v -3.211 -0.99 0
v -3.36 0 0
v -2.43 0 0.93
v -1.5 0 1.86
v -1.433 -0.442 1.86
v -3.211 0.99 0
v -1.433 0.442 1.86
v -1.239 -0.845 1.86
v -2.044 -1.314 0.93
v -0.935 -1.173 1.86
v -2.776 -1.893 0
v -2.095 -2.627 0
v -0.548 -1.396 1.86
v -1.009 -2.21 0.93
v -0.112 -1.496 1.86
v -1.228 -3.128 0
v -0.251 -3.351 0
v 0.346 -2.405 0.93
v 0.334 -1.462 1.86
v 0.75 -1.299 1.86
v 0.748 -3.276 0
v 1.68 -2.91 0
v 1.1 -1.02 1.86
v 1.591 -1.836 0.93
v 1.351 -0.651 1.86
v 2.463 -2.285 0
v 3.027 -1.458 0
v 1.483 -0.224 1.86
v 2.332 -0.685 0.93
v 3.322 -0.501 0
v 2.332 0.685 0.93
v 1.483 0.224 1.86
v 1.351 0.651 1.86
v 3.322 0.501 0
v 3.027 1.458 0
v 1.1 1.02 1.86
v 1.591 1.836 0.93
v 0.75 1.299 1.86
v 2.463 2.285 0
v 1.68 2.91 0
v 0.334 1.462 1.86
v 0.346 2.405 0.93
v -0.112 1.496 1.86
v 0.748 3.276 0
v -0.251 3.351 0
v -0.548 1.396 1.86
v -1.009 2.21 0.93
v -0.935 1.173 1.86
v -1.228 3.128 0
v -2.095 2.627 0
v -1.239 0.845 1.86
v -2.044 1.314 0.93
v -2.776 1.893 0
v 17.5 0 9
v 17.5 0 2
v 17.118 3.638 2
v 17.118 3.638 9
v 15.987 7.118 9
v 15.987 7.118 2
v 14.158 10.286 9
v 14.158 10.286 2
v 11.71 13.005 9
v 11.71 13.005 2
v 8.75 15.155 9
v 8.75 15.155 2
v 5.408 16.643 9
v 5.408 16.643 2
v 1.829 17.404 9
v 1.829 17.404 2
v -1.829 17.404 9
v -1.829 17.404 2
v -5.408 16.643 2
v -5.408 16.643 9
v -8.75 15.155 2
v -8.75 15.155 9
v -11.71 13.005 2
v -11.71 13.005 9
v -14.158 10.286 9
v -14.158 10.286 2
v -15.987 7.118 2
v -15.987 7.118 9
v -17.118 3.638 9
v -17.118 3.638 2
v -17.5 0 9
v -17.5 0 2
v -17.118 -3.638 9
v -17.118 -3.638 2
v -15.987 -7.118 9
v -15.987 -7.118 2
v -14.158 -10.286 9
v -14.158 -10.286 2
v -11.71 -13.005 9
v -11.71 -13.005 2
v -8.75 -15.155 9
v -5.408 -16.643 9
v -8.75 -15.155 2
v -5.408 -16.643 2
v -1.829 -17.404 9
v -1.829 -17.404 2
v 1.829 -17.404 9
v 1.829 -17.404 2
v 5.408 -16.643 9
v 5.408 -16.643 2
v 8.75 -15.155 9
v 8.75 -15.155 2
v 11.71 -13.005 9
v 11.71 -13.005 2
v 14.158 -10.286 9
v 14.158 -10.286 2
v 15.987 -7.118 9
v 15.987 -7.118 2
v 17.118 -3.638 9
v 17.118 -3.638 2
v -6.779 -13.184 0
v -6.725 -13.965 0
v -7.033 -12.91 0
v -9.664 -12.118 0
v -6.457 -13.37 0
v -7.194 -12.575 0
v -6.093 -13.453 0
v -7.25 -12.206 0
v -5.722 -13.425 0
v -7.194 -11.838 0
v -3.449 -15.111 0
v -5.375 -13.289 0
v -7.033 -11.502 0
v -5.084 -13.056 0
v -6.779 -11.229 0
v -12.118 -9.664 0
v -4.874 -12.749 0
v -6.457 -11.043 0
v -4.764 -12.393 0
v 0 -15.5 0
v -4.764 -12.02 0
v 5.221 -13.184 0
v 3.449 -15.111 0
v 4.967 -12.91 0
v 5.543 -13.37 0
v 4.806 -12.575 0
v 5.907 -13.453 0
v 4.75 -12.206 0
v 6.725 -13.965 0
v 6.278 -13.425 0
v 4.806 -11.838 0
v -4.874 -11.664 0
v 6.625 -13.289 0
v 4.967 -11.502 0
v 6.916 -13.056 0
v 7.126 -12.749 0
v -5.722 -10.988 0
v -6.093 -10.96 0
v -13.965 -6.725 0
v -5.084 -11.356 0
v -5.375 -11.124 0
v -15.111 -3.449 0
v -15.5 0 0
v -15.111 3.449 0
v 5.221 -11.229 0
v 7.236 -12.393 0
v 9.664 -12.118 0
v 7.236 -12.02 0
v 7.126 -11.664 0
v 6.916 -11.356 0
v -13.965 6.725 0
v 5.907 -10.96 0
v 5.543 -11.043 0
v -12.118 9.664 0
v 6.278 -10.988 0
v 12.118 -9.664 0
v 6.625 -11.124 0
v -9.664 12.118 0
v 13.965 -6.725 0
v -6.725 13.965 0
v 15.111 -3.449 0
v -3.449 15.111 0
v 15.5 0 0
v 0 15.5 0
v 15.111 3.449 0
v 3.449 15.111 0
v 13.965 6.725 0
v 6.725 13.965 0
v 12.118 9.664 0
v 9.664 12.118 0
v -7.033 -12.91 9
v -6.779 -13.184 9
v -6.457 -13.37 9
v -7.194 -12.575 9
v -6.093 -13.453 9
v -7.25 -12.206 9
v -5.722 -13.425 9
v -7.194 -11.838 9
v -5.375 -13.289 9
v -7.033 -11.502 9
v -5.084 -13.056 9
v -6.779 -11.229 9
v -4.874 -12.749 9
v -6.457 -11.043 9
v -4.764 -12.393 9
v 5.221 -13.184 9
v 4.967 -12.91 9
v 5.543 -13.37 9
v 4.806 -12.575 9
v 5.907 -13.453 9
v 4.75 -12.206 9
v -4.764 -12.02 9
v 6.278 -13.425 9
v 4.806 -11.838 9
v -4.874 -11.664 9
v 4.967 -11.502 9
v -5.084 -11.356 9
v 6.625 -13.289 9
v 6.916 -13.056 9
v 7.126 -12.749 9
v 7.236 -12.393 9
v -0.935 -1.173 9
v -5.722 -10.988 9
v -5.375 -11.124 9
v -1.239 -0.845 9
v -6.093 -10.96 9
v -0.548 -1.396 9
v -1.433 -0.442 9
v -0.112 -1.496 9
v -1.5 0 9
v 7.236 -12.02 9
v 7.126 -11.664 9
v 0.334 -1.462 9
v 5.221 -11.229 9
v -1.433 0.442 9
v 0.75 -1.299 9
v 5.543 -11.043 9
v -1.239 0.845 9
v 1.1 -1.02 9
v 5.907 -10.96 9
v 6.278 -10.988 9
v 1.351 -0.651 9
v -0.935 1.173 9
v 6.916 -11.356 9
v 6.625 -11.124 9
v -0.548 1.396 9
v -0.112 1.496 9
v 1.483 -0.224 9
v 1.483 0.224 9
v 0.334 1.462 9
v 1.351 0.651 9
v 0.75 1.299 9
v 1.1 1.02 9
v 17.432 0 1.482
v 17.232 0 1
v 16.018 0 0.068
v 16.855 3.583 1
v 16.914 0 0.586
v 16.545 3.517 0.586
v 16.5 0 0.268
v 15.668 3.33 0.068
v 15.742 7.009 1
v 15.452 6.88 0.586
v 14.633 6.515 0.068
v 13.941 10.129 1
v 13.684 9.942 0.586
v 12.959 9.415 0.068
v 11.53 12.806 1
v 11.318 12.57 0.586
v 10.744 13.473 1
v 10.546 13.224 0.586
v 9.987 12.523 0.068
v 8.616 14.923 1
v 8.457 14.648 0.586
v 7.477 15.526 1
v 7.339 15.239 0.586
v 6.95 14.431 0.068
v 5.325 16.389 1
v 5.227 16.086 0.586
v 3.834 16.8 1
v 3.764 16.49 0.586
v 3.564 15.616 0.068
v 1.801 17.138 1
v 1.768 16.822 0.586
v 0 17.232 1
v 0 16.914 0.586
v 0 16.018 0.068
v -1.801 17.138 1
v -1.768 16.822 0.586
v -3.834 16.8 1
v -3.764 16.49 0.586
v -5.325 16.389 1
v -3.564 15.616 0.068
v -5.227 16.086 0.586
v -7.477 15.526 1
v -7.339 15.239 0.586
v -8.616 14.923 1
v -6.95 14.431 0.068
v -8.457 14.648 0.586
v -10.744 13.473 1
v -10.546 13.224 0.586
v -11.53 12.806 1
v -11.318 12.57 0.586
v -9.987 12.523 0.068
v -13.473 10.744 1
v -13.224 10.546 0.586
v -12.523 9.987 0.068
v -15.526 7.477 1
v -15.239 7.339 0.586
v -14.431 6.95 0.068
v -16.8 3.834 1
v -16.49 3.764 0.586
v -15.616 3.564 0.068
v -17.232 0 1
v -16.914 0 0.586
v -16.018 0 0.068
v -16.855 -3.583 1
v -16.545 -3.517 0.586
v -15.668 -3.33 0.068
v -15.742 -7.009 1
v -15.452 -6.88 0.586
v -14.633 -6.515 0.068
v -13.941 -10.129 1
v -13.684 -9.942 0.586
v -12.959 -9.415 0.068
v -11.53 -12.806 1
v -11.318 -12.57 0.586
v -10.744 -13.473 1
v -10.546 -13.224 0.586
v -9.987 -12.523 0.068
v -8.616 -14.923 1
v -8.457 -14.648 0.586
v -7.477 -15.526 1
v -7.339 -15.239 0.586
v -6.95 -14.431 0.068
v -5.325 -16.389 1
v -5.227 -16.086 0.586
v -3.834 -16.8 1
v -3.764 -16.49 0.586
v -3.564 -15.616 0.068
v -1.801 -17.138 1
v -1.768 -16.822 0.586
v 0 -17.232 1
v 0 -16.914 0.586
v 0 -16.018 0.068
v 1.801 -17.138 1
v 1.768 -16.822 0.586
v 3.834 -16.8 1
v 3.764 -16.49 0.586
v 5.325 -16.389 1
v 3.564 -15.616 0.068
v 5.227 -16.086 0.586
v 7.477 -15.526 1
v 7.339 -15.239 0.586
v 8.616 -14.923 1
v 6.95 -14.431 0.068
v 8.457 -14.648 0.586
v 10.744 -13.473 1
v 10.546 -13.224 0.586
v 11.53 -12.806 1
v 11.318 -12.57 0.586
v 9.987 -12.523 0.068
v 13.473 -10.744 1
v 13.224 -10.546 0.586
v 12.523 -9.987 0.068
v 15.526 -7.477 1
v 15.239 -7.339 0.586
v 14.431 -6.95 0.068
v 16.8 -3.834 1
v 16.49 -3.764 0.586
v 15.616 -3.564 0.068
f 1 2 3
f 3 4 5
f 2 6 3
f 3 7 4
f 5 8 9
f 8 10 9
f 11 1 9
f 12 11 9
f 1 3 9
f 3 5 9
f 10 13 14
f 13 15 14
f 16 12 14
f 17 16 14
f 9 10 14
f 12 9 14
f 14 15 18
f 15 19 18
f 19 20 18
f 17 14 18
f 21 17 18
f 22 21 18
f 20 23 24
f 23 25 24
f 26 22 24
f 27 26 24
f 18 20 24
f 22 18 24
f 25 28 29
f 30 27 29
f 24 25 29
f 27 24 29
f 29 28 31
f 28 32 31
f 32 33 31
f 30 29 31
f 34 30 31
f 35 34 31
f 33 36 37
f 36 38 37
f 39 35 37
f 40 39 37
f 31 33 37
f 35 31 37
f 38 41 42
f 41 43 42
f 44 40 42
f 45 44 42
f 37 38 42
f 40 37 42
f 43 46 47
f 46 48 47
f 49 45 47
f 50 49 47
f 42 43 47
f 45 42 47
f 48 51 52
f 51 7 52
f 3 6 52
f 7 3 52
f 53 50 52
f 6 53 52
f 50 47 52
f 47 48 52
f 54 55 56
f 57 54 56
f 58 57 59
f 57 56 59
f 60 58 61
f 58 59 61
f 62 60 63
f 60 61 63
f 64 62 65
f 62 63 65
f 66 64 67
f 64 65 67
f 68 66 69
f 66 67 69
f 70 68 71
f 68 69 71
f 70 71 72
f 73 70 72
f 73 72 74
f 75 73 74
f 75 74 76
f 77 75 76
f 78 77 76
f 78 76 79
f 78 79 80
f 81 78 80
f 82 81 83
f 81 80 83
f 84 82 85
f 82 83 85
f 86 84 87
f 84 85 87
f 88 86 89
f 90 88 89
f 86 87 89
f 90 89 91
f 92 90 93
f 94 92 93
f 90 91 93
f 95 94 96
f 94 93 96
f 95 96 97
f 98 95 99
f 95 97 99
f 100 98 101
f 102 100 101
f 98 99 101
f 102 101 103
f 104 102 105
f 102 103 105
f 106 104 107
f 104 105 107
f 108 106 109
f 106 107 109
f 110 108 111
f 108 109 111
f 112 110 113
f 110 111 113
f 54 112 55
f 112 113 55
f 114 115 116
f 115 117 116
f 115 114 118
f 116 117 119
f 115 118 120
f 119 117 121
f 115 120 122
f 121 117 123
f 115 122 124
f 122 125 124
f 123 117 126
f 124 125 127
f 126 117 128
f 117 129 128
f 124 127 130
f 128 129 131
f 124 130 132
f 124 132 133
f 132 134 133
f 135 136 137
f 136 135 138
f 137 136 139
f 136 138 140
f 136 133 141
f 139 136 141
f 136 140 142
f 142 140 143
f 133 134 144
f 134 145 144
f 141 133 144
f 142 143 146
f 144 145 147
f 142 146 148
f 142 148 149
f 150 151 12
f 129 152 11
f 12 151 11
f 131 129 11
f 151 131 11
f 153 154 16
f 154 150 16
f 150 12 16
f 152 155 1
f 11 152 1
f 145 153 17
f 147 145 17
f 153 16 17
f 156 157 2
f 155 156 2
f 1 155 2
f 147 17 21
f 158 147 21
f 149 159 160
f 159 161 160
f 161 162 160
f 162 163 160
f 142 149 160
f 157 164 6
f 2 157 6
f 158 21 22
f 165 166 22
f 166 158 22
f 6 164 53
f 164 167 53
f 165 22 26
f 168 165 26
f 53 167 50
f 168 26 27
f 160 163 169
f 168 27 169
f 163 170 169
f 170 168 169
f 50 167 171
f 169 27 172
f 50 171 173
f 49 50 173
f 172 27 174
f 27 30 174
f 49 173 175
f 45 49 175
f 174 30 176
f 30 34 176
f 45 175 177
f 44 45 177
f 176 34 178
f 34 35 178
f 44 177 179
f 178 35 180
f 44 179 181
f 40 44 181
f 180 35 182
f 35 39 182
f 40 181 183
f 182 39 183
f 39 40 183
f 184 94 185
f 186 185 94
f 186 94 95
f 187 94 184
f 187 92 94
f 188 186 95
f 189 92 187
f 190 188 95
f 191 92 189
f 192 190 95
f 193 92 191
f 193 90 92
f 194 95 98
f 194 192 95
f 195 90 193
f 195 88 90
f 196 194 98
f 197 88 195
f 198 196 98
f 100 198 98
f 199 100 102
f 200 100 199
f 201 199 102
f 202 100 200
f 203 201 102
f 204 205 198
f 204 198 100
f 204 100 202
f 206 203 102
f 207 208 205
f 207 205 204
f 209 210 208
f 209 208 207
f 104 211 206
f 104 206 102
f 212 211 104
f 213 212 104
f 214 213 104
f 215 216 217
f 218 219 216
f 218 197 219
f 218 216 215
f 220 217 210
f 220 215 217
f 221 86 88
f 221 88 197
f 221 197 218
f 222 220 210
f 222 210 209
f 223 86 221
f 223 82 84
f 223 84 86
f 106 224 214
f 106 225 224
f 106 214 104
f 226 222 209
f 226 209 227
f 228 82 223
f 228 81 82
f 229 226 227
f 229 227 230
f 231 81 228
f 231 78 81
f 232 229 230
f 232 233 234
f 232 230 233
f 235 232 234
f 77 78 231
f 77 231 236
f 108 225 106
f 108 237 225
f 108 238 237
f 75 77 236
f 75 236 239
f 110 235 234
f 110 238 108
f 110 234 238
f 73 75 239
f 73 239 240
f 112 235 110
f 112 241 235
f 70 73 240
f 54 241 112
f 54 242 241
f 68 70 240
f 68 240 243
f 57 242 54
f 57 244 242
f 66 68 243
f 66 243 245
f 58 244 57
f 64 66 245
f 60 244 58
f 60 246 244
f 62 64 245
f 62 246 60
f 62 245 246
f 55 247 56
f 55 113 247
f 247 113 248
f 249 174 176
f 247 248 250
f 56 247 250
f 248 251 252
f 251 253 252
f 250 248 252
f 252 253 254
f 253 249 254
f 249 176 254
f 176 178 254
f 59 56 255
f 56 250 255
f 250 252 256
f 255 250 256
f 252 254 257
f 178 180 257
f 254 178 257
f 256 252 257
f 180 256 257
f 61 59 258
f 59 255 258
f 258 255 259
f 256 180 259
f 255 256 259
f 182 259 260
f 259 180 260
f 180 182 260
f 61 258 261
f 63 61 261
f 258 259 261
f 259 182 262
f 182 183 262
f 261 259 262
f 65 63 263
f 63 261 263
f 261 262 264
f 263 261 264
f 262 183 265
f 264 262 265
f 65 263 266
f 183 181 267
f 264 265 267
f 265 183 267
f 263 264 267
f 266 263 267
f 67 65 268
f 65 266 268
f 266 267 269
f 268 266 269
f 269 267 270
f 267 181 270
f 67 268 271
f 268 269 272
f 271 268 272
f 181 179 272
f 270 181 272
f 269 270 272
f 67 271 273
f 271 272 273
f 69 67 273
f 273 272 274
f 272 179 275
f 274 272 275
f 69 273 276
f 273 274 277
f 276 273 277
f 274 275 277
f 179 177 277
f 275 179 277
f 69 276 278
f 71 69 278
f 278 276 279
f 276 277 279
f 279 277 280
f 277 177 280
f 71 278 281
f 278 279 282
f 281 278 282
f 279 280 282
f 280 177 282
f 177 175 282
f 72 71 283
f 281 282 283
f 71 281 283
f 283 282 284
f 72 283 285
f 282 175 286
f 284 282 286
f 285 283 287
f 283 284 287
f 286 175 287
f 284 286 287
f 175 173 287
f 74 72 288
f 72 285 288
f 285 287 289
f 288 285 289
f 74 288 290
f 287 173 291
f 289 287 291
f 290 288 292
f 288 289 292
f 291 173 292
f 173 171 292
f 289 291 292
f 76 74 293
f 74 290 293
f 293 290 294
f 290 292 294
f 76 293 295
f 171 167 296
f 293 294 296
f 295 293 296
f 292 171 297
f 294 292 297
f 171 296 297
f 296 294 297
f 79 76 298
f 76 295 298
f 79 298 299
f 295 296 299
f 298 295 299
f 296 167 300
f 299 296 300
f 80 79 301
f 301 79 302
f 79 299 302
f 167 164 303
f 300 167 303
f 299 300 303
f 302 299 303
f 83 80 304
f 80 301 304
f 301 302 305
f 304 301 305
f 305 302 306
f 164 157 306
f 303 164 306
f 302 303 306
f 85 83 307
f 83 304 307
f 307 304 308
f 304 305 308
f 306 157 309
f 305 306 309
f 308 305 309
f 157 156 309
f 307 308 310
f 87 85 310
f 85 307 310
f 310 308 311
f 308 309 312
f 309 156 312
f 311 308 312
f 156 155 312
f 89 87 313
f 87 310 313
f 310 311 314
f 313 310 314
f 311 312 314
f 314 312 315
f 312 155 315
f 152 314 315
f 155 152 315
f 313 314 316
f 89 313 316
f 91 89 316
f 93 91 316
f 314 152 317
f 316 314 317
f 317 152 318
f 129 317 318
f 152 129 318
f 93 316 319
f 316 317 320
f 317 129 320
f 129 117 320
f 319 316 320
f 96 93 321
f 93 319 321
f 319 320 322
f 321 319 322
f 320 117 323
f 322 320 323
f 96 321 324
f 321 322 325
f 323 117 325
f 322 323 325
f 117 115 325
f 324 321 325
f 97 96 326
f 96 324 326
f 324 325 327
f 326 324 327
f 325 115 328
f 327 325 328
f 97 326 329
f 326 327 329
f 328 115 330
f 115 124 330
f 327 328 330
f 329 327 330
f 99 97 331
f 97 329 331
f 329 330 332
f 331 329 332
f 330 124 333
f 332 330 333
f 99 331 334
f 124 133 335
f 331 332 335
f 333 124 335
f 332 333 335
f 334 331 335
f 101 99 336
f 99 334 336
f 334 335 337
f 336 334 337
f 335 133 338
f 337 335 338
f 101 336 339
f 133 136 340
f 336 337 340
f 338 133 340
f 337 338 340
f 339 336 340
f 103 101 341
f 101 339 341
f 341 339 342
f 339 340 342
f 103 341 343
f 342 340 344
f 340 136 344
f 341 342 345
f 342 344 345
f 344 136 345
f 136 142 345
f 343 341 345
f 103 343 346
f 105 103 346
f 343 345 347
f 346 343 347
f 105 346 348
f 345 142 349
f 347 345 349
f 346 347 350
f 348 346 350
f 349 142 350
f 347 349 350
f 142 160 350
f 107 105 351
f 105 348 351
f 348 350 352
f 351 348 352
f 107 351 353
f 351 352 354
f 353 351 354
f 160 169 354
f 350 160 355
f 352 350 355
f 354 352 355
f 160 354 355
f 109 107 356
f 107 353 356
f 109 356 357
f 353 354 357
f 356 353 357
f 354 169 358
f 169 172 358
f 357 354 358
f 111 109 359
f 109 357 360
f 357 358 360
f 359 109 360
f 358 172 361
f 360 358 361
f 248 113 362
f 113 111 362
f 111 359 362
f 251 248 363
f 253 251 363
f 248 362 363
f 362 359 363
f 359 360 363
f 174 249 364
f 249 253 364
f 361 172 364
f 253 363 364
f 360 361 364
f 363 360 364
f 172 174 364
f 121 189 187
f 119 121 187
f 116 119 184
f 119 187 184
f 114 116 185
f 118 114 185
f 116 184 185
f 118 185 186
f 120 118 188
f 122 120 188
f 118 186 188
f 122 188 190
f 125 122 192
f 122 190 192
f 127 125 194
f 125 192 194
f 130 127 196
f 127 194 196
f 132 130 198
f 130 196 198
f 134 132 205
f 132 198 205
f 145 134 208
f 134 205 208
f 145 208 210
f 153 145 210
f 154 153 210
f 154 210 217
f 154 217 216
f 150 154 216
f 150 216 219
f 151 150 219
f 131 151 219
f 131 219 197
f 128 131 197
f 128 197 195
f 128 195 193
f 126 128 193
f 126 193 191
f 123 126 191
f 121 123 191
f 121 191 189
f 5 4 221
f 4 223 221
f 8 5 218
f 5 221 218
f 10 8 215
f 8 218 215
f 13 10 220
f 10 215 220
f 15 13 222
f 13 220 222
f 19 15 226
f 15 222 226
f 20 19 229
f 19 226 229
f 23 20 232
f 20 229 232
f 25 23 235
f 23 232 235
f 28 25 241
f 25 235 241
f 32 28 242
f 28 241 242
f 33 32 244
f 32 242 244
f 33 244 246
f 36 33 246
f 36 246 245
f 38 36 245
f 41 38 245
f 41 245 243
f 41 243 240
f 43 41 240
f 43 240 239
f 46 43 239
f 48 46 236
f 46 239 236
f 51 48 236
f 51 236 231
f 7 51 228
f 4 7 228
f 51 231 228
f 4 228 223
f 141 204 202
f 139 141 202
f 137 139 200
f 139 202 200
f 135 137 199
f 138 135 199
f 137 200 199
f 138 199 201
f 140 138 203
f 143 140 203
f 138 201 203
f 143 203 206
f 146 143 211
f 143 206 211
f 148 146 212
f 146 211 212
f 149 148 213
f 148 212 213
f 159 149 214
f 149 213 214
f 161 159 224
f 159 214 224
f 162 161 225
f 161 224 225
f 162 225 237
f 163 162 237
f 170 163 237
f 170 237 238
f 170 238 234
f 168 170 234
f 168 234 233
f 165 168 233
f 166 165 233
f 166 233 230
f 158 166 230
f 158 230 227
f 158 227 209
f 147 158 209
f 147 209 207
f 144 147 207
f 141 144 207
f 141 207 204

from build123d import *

# Parameters (mm, degrees)
F0_R           = 17.5
F1_DEPTH       = 9
F2_D           = 3
F2_CSINK_D     = 6.72
F2_CSINK_ANGLE = 90
F3_D           = 2.5
F4_R           = 2


with BuildPart() as f1:
    # F0 (on Top) → F1 (new body)
    with BuildSketch(Plane.XY):
        Circle(F0_R)
    extrude(amount=F1_DEPTH)

    # F2 (through all)
    with Locations(Plane(origin=(0, 0, 0), x_dir=(1, 0, 0), z_dir=(0, 0, -1))):
        with Locations((0, 0)):
            CounterSinkHole(F2_D / 2, F2_CSINK_D / 2, counter_sink_angle=F2_CSINK_ANGLE)

    # F3 (through all)
    with Locations(Plane(origin=(0, 0, 0), x_dir=(1, 0, 0), z_dir=(0, 0, -1))):
        with Locations((6, 12.2062498704), (-6, 12.2062498704)):
            Hole(F3_D / 2)

    # F4
    f4_edges = [f1.edges().sort_by_distance(p)[0] for p in [
        (-17.5, 0, 0),
    ]]
    fillet(f4_edges, radius=F4_R)


solid = f1.part
